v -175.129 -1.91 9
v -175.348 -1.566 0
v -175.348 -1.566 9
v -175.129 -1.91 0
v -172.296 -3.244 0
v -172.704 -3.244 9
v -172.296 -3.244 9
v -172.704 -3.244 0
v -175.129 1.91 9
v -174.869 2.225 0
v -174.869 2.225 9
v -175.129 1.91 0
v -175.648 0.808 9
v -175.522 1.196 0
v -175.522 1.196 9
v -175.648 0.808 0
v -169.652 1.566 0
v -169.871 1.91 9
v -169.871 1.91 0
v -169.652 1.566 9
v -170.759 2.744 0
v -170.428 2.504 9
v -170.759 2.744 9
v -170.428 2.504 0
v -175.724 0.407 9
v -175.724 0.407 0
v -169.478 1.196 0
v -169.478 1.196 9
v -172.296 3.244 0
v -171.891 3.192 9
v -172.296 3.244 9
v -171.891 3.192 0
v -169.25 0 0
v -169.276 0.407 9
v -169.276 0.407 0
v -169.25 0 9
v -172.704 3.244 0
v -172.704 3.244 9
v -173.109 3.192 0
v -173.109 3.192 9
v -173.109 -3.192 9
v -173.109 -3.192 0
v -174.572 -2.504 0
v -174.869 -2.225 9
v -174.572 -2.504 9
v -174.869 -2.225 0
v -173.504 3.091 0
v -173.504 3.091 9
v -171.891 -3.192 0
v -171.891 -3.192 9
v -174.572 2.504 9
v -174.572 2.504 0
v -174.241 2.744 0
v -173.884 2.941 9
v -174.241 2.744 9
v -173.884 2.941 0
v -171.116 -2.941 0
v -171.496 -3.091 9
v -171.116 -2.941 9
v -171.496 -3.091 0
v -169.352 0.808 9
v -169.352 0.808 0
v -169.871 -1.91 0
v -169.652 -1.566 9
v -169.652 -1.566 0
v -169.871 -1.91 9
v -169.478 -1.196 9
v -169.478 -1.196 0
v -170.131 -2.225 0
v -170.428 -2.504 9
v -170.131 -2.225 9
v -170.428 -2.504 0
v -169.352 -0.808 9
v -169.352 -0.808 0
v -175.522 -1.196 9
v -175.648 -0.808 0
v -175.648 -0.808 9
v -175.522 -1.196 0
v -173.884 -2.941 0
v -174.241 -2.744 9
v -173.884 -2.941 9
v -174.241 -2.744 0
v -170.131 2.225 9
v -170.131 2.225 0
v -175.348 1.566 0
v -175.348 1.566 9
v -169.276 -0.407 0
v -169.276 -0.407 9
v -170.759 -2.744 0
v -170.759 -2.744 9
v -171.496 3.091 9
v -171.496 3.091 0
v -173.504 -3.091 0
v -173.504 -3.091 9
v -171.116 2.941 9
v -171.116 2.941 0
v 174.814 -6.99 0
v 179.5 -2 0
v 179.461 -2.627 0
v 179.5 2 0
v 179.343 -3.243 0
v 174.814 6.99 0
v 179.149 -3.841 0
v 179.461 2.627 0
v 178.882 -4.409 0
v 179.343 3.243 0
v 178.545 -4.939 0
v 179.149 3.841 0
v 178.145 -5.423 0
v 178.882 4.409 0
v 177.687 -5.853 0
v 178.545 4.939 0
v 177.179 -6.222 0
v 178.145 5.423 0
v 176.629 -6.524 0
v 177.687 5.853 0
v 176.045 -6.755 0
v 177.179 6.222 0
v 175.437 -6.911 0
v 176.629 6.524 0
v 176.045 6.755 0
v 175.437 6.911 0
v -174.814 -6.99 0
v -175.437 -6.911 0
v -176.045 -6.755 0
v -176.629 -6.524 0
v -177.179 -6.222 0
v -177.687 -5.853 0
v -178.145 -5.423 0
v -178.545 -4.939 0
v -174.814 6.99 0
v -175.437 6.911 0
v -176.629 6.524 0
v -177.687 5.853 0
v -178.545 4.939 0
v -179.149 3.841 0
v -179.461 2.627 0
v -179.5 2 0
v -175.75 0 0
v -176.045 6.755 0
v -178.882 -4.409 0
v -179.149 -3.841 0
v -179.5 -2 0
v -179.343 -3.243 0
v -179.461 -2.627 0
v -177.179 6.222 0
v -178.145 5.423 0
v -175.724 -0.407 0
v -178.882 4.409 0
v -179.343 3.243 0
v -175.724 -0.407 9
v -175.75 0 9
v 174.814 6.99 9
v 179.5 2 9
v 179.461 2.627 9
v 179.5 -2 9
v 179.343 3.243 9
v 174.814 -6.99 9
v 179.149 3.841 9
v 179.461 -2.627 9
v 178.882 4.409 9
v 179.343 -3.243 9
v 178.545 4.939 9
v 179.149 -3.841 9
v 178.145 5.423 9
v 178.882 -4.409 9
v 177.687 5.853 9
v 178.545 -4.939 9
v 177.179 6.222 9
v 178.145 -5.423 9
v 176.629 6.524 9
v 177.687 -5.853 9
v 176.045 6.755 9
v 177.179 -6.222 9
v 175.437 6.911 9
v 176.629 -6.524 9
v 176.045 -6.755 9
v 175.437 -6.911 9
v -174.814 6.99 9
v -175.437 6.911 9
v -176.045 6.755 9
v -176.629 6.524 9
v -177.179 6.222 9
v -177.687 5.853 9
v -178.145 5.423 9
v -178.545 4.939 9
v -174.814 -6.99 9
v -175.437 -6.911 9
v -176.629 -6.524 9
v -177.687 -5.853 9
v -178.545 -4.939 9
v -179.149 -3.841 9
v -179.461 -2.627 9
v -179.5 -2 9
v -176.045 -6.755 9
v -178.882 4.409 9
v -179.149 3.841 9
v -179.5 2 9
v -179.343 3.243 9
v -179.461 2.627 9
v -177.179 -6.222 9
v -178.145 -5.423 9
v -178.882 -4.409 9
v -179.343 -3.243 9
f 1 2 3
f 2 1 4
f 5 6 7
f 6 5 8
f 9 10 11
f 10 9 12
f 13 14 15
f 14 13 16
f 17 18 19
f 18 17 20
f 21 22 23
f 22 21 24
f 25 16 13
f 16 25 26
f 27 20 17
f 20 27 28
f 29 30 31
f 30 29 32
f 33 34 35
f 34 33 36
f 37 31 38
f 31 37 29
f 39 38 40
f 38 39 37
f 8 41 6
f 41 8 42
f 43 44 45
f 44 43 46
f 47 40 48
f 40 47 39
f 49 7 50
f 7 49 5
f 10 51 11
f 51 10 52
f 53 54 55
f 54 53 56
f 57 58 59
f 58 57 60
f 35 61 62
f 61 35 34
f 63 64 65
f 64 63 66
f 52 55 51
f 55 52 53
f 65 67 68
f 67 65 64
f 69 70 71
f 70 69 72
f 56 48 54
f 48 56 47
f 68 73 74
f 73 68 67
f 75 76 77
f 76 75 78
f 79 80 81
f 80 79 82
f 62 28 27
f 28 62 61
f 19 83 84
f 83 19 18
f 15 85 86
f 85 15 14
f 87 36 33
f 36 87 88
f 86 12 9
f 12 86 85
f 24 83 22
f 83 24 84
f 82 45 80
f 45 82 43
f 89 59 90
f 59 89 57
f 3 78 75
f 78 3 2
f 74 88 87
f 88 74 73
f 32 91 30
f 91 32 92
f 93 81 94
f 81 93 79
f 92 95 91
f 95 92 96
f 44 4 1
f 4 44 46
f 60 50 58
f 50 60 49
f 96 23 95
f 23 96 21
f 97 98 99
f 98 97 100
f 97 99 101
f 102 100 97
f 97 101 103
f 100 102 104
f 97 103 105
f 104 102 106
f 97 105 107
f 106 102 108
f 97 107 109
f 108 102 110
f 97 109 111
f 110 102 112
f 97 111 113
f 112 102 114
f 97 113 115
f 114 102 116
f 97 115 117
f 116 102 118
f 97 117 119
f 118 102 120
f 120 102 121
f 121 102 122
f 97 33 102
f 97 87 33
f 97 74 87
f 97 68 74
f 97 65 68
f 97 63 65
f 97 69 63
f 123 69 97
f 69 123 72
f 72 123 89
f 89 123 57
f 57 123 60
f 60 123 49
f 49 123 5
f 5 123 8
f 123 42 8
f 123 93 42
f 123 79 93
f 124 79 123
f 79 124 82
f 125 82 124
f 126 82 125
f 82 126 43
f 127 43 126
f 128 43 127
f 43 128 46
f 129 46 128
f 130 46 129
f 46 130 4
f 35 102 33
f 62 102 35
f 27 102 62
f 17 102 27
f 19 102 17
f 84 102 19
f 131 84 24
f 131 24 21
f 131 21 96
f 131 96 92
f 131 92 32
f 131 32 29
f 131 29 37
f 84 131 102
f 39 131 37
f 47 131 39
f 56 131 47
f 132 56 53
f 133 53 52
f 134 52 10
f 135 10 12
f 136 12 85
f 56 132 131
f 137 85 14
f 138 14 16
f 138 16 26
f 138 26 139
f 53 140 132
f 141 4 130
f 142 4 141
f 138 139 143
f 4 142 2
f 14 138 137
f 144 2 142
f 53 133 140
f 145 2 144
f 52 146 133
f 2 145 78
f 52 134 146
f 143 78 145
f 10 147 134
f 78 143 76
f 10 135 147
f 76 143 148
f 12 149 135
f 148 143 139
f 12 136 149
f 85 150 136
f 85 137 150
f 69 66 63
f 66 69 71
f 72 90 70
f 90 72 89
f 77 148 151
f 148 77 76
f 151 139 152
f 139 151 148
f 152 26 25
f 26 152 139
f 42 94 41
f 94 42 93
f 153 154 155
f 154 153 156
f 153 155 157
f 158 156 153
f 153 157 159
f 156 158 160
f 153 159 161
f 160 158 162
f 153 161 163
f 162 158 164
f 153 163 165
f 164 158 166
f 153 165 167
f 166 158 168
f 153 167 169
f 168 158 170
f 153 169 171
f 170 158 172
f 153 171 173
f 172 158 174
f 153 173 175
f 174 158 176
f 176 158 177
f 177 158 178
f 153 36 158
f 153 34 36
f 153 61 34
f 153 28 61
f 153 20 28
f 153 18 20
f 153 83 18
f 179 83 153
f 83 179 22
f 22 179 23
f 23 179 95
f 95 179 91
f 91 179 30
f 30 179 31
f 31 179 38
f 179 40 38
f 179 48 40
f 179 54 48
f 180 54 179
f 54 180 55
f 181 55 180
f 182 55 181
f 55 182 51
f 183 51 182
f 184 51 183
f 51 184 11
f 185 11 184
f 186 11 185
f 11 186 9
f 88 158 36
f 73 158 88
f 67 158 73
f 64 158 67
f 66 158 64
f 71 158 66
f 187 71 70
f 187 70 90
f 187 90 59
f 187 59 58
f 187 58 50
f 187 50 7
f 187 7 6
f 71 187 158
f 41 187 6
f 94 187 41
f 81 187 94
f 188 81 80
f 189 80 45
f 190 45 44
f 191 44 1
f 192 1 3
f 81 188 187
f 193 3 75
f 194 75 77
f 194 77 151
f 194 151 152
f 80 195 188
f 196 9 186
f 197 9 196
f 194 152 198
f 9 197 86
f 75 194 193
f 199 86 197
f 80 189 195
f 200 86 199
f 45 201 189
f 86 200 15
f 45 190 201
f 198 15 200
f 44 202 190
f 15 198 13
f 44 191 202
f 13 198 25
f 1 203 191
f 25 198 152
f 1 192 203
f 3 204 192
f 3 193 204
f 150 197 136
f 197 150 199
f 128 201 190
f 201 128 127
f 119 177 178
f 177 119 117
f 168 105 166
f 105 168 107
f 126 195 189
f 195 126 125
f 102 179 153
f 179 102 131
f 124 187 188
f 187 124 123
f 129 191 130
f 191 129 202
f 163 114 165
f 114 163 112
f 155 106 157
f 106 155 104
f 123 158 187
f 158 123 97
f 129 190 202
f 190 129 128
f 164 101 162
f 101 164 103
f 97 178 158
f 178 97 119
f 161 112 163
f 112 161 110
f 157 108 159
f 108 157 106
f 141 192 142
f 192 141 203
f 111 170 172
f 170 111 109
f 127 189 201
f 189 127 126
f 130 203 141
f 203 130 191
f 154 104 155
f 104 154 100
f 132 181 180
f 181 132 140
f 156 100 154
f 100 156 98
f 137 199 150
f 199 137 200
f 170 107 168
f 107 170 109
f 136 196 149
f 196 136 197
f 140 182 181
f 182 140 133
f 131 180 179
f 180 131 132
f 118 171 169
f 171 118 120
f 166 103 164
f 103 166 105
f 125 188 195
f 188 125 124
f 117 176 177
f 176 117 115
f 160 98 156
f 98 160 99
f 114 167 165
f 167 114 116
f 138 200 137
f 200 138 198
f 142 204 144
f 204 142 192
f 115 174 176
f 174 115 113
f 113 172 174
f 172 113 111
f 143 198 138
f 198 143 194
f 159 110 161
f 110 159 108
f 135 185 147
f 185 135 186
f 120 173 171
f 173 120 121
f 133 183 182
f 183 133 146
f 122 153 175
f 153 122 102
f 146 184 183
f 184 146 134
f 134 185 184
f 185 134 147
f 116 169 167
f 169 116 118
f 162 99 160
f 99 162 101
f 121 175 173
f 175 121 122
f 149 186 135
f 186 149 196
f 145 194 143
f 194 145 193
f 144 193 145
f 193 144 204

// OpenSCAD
$fn = 50;


difference() {
	union() {
		hull() {
			translate(v = [-174.5000000000, 2.0000000000, 0]) {
				cylinder(h = 9, r = 5);
			}
			translate(v = [174.5000000000, 2.0000000000, 0]) {
				cylinder(h = 9, r = 5);
			}
			translate(v = [-174.5000000000, -2.0000000000, 0]) {
				cylinder(h = 9, r = 5);
			}
			translate(v = [174.5000000000, -2.0000000000, 0]) {
				cylinder(h = 9, r = 5);
			}
		}
	}
	union() {
		translate(v = [-172.5000000000, 0.0000000000, 0]) {
			cylinder(h = 9, r = 3.2500000000);
		}
		translate(v = [-172.5000000000, 0.0000000000, 0]) {
			cylinder(h = 9, r = 1.8000000000);
		}
		translate(v = [-172.5000000000, 0.0000000000, 0]) {
			cylinder(h = 9, r = 1.8000000000);
		}
		translate(v = [-172.5000000000, 0.0000000000, 0]) {
			cylinder(h = 9, r = 1.8000000000);
		}
	}
}
